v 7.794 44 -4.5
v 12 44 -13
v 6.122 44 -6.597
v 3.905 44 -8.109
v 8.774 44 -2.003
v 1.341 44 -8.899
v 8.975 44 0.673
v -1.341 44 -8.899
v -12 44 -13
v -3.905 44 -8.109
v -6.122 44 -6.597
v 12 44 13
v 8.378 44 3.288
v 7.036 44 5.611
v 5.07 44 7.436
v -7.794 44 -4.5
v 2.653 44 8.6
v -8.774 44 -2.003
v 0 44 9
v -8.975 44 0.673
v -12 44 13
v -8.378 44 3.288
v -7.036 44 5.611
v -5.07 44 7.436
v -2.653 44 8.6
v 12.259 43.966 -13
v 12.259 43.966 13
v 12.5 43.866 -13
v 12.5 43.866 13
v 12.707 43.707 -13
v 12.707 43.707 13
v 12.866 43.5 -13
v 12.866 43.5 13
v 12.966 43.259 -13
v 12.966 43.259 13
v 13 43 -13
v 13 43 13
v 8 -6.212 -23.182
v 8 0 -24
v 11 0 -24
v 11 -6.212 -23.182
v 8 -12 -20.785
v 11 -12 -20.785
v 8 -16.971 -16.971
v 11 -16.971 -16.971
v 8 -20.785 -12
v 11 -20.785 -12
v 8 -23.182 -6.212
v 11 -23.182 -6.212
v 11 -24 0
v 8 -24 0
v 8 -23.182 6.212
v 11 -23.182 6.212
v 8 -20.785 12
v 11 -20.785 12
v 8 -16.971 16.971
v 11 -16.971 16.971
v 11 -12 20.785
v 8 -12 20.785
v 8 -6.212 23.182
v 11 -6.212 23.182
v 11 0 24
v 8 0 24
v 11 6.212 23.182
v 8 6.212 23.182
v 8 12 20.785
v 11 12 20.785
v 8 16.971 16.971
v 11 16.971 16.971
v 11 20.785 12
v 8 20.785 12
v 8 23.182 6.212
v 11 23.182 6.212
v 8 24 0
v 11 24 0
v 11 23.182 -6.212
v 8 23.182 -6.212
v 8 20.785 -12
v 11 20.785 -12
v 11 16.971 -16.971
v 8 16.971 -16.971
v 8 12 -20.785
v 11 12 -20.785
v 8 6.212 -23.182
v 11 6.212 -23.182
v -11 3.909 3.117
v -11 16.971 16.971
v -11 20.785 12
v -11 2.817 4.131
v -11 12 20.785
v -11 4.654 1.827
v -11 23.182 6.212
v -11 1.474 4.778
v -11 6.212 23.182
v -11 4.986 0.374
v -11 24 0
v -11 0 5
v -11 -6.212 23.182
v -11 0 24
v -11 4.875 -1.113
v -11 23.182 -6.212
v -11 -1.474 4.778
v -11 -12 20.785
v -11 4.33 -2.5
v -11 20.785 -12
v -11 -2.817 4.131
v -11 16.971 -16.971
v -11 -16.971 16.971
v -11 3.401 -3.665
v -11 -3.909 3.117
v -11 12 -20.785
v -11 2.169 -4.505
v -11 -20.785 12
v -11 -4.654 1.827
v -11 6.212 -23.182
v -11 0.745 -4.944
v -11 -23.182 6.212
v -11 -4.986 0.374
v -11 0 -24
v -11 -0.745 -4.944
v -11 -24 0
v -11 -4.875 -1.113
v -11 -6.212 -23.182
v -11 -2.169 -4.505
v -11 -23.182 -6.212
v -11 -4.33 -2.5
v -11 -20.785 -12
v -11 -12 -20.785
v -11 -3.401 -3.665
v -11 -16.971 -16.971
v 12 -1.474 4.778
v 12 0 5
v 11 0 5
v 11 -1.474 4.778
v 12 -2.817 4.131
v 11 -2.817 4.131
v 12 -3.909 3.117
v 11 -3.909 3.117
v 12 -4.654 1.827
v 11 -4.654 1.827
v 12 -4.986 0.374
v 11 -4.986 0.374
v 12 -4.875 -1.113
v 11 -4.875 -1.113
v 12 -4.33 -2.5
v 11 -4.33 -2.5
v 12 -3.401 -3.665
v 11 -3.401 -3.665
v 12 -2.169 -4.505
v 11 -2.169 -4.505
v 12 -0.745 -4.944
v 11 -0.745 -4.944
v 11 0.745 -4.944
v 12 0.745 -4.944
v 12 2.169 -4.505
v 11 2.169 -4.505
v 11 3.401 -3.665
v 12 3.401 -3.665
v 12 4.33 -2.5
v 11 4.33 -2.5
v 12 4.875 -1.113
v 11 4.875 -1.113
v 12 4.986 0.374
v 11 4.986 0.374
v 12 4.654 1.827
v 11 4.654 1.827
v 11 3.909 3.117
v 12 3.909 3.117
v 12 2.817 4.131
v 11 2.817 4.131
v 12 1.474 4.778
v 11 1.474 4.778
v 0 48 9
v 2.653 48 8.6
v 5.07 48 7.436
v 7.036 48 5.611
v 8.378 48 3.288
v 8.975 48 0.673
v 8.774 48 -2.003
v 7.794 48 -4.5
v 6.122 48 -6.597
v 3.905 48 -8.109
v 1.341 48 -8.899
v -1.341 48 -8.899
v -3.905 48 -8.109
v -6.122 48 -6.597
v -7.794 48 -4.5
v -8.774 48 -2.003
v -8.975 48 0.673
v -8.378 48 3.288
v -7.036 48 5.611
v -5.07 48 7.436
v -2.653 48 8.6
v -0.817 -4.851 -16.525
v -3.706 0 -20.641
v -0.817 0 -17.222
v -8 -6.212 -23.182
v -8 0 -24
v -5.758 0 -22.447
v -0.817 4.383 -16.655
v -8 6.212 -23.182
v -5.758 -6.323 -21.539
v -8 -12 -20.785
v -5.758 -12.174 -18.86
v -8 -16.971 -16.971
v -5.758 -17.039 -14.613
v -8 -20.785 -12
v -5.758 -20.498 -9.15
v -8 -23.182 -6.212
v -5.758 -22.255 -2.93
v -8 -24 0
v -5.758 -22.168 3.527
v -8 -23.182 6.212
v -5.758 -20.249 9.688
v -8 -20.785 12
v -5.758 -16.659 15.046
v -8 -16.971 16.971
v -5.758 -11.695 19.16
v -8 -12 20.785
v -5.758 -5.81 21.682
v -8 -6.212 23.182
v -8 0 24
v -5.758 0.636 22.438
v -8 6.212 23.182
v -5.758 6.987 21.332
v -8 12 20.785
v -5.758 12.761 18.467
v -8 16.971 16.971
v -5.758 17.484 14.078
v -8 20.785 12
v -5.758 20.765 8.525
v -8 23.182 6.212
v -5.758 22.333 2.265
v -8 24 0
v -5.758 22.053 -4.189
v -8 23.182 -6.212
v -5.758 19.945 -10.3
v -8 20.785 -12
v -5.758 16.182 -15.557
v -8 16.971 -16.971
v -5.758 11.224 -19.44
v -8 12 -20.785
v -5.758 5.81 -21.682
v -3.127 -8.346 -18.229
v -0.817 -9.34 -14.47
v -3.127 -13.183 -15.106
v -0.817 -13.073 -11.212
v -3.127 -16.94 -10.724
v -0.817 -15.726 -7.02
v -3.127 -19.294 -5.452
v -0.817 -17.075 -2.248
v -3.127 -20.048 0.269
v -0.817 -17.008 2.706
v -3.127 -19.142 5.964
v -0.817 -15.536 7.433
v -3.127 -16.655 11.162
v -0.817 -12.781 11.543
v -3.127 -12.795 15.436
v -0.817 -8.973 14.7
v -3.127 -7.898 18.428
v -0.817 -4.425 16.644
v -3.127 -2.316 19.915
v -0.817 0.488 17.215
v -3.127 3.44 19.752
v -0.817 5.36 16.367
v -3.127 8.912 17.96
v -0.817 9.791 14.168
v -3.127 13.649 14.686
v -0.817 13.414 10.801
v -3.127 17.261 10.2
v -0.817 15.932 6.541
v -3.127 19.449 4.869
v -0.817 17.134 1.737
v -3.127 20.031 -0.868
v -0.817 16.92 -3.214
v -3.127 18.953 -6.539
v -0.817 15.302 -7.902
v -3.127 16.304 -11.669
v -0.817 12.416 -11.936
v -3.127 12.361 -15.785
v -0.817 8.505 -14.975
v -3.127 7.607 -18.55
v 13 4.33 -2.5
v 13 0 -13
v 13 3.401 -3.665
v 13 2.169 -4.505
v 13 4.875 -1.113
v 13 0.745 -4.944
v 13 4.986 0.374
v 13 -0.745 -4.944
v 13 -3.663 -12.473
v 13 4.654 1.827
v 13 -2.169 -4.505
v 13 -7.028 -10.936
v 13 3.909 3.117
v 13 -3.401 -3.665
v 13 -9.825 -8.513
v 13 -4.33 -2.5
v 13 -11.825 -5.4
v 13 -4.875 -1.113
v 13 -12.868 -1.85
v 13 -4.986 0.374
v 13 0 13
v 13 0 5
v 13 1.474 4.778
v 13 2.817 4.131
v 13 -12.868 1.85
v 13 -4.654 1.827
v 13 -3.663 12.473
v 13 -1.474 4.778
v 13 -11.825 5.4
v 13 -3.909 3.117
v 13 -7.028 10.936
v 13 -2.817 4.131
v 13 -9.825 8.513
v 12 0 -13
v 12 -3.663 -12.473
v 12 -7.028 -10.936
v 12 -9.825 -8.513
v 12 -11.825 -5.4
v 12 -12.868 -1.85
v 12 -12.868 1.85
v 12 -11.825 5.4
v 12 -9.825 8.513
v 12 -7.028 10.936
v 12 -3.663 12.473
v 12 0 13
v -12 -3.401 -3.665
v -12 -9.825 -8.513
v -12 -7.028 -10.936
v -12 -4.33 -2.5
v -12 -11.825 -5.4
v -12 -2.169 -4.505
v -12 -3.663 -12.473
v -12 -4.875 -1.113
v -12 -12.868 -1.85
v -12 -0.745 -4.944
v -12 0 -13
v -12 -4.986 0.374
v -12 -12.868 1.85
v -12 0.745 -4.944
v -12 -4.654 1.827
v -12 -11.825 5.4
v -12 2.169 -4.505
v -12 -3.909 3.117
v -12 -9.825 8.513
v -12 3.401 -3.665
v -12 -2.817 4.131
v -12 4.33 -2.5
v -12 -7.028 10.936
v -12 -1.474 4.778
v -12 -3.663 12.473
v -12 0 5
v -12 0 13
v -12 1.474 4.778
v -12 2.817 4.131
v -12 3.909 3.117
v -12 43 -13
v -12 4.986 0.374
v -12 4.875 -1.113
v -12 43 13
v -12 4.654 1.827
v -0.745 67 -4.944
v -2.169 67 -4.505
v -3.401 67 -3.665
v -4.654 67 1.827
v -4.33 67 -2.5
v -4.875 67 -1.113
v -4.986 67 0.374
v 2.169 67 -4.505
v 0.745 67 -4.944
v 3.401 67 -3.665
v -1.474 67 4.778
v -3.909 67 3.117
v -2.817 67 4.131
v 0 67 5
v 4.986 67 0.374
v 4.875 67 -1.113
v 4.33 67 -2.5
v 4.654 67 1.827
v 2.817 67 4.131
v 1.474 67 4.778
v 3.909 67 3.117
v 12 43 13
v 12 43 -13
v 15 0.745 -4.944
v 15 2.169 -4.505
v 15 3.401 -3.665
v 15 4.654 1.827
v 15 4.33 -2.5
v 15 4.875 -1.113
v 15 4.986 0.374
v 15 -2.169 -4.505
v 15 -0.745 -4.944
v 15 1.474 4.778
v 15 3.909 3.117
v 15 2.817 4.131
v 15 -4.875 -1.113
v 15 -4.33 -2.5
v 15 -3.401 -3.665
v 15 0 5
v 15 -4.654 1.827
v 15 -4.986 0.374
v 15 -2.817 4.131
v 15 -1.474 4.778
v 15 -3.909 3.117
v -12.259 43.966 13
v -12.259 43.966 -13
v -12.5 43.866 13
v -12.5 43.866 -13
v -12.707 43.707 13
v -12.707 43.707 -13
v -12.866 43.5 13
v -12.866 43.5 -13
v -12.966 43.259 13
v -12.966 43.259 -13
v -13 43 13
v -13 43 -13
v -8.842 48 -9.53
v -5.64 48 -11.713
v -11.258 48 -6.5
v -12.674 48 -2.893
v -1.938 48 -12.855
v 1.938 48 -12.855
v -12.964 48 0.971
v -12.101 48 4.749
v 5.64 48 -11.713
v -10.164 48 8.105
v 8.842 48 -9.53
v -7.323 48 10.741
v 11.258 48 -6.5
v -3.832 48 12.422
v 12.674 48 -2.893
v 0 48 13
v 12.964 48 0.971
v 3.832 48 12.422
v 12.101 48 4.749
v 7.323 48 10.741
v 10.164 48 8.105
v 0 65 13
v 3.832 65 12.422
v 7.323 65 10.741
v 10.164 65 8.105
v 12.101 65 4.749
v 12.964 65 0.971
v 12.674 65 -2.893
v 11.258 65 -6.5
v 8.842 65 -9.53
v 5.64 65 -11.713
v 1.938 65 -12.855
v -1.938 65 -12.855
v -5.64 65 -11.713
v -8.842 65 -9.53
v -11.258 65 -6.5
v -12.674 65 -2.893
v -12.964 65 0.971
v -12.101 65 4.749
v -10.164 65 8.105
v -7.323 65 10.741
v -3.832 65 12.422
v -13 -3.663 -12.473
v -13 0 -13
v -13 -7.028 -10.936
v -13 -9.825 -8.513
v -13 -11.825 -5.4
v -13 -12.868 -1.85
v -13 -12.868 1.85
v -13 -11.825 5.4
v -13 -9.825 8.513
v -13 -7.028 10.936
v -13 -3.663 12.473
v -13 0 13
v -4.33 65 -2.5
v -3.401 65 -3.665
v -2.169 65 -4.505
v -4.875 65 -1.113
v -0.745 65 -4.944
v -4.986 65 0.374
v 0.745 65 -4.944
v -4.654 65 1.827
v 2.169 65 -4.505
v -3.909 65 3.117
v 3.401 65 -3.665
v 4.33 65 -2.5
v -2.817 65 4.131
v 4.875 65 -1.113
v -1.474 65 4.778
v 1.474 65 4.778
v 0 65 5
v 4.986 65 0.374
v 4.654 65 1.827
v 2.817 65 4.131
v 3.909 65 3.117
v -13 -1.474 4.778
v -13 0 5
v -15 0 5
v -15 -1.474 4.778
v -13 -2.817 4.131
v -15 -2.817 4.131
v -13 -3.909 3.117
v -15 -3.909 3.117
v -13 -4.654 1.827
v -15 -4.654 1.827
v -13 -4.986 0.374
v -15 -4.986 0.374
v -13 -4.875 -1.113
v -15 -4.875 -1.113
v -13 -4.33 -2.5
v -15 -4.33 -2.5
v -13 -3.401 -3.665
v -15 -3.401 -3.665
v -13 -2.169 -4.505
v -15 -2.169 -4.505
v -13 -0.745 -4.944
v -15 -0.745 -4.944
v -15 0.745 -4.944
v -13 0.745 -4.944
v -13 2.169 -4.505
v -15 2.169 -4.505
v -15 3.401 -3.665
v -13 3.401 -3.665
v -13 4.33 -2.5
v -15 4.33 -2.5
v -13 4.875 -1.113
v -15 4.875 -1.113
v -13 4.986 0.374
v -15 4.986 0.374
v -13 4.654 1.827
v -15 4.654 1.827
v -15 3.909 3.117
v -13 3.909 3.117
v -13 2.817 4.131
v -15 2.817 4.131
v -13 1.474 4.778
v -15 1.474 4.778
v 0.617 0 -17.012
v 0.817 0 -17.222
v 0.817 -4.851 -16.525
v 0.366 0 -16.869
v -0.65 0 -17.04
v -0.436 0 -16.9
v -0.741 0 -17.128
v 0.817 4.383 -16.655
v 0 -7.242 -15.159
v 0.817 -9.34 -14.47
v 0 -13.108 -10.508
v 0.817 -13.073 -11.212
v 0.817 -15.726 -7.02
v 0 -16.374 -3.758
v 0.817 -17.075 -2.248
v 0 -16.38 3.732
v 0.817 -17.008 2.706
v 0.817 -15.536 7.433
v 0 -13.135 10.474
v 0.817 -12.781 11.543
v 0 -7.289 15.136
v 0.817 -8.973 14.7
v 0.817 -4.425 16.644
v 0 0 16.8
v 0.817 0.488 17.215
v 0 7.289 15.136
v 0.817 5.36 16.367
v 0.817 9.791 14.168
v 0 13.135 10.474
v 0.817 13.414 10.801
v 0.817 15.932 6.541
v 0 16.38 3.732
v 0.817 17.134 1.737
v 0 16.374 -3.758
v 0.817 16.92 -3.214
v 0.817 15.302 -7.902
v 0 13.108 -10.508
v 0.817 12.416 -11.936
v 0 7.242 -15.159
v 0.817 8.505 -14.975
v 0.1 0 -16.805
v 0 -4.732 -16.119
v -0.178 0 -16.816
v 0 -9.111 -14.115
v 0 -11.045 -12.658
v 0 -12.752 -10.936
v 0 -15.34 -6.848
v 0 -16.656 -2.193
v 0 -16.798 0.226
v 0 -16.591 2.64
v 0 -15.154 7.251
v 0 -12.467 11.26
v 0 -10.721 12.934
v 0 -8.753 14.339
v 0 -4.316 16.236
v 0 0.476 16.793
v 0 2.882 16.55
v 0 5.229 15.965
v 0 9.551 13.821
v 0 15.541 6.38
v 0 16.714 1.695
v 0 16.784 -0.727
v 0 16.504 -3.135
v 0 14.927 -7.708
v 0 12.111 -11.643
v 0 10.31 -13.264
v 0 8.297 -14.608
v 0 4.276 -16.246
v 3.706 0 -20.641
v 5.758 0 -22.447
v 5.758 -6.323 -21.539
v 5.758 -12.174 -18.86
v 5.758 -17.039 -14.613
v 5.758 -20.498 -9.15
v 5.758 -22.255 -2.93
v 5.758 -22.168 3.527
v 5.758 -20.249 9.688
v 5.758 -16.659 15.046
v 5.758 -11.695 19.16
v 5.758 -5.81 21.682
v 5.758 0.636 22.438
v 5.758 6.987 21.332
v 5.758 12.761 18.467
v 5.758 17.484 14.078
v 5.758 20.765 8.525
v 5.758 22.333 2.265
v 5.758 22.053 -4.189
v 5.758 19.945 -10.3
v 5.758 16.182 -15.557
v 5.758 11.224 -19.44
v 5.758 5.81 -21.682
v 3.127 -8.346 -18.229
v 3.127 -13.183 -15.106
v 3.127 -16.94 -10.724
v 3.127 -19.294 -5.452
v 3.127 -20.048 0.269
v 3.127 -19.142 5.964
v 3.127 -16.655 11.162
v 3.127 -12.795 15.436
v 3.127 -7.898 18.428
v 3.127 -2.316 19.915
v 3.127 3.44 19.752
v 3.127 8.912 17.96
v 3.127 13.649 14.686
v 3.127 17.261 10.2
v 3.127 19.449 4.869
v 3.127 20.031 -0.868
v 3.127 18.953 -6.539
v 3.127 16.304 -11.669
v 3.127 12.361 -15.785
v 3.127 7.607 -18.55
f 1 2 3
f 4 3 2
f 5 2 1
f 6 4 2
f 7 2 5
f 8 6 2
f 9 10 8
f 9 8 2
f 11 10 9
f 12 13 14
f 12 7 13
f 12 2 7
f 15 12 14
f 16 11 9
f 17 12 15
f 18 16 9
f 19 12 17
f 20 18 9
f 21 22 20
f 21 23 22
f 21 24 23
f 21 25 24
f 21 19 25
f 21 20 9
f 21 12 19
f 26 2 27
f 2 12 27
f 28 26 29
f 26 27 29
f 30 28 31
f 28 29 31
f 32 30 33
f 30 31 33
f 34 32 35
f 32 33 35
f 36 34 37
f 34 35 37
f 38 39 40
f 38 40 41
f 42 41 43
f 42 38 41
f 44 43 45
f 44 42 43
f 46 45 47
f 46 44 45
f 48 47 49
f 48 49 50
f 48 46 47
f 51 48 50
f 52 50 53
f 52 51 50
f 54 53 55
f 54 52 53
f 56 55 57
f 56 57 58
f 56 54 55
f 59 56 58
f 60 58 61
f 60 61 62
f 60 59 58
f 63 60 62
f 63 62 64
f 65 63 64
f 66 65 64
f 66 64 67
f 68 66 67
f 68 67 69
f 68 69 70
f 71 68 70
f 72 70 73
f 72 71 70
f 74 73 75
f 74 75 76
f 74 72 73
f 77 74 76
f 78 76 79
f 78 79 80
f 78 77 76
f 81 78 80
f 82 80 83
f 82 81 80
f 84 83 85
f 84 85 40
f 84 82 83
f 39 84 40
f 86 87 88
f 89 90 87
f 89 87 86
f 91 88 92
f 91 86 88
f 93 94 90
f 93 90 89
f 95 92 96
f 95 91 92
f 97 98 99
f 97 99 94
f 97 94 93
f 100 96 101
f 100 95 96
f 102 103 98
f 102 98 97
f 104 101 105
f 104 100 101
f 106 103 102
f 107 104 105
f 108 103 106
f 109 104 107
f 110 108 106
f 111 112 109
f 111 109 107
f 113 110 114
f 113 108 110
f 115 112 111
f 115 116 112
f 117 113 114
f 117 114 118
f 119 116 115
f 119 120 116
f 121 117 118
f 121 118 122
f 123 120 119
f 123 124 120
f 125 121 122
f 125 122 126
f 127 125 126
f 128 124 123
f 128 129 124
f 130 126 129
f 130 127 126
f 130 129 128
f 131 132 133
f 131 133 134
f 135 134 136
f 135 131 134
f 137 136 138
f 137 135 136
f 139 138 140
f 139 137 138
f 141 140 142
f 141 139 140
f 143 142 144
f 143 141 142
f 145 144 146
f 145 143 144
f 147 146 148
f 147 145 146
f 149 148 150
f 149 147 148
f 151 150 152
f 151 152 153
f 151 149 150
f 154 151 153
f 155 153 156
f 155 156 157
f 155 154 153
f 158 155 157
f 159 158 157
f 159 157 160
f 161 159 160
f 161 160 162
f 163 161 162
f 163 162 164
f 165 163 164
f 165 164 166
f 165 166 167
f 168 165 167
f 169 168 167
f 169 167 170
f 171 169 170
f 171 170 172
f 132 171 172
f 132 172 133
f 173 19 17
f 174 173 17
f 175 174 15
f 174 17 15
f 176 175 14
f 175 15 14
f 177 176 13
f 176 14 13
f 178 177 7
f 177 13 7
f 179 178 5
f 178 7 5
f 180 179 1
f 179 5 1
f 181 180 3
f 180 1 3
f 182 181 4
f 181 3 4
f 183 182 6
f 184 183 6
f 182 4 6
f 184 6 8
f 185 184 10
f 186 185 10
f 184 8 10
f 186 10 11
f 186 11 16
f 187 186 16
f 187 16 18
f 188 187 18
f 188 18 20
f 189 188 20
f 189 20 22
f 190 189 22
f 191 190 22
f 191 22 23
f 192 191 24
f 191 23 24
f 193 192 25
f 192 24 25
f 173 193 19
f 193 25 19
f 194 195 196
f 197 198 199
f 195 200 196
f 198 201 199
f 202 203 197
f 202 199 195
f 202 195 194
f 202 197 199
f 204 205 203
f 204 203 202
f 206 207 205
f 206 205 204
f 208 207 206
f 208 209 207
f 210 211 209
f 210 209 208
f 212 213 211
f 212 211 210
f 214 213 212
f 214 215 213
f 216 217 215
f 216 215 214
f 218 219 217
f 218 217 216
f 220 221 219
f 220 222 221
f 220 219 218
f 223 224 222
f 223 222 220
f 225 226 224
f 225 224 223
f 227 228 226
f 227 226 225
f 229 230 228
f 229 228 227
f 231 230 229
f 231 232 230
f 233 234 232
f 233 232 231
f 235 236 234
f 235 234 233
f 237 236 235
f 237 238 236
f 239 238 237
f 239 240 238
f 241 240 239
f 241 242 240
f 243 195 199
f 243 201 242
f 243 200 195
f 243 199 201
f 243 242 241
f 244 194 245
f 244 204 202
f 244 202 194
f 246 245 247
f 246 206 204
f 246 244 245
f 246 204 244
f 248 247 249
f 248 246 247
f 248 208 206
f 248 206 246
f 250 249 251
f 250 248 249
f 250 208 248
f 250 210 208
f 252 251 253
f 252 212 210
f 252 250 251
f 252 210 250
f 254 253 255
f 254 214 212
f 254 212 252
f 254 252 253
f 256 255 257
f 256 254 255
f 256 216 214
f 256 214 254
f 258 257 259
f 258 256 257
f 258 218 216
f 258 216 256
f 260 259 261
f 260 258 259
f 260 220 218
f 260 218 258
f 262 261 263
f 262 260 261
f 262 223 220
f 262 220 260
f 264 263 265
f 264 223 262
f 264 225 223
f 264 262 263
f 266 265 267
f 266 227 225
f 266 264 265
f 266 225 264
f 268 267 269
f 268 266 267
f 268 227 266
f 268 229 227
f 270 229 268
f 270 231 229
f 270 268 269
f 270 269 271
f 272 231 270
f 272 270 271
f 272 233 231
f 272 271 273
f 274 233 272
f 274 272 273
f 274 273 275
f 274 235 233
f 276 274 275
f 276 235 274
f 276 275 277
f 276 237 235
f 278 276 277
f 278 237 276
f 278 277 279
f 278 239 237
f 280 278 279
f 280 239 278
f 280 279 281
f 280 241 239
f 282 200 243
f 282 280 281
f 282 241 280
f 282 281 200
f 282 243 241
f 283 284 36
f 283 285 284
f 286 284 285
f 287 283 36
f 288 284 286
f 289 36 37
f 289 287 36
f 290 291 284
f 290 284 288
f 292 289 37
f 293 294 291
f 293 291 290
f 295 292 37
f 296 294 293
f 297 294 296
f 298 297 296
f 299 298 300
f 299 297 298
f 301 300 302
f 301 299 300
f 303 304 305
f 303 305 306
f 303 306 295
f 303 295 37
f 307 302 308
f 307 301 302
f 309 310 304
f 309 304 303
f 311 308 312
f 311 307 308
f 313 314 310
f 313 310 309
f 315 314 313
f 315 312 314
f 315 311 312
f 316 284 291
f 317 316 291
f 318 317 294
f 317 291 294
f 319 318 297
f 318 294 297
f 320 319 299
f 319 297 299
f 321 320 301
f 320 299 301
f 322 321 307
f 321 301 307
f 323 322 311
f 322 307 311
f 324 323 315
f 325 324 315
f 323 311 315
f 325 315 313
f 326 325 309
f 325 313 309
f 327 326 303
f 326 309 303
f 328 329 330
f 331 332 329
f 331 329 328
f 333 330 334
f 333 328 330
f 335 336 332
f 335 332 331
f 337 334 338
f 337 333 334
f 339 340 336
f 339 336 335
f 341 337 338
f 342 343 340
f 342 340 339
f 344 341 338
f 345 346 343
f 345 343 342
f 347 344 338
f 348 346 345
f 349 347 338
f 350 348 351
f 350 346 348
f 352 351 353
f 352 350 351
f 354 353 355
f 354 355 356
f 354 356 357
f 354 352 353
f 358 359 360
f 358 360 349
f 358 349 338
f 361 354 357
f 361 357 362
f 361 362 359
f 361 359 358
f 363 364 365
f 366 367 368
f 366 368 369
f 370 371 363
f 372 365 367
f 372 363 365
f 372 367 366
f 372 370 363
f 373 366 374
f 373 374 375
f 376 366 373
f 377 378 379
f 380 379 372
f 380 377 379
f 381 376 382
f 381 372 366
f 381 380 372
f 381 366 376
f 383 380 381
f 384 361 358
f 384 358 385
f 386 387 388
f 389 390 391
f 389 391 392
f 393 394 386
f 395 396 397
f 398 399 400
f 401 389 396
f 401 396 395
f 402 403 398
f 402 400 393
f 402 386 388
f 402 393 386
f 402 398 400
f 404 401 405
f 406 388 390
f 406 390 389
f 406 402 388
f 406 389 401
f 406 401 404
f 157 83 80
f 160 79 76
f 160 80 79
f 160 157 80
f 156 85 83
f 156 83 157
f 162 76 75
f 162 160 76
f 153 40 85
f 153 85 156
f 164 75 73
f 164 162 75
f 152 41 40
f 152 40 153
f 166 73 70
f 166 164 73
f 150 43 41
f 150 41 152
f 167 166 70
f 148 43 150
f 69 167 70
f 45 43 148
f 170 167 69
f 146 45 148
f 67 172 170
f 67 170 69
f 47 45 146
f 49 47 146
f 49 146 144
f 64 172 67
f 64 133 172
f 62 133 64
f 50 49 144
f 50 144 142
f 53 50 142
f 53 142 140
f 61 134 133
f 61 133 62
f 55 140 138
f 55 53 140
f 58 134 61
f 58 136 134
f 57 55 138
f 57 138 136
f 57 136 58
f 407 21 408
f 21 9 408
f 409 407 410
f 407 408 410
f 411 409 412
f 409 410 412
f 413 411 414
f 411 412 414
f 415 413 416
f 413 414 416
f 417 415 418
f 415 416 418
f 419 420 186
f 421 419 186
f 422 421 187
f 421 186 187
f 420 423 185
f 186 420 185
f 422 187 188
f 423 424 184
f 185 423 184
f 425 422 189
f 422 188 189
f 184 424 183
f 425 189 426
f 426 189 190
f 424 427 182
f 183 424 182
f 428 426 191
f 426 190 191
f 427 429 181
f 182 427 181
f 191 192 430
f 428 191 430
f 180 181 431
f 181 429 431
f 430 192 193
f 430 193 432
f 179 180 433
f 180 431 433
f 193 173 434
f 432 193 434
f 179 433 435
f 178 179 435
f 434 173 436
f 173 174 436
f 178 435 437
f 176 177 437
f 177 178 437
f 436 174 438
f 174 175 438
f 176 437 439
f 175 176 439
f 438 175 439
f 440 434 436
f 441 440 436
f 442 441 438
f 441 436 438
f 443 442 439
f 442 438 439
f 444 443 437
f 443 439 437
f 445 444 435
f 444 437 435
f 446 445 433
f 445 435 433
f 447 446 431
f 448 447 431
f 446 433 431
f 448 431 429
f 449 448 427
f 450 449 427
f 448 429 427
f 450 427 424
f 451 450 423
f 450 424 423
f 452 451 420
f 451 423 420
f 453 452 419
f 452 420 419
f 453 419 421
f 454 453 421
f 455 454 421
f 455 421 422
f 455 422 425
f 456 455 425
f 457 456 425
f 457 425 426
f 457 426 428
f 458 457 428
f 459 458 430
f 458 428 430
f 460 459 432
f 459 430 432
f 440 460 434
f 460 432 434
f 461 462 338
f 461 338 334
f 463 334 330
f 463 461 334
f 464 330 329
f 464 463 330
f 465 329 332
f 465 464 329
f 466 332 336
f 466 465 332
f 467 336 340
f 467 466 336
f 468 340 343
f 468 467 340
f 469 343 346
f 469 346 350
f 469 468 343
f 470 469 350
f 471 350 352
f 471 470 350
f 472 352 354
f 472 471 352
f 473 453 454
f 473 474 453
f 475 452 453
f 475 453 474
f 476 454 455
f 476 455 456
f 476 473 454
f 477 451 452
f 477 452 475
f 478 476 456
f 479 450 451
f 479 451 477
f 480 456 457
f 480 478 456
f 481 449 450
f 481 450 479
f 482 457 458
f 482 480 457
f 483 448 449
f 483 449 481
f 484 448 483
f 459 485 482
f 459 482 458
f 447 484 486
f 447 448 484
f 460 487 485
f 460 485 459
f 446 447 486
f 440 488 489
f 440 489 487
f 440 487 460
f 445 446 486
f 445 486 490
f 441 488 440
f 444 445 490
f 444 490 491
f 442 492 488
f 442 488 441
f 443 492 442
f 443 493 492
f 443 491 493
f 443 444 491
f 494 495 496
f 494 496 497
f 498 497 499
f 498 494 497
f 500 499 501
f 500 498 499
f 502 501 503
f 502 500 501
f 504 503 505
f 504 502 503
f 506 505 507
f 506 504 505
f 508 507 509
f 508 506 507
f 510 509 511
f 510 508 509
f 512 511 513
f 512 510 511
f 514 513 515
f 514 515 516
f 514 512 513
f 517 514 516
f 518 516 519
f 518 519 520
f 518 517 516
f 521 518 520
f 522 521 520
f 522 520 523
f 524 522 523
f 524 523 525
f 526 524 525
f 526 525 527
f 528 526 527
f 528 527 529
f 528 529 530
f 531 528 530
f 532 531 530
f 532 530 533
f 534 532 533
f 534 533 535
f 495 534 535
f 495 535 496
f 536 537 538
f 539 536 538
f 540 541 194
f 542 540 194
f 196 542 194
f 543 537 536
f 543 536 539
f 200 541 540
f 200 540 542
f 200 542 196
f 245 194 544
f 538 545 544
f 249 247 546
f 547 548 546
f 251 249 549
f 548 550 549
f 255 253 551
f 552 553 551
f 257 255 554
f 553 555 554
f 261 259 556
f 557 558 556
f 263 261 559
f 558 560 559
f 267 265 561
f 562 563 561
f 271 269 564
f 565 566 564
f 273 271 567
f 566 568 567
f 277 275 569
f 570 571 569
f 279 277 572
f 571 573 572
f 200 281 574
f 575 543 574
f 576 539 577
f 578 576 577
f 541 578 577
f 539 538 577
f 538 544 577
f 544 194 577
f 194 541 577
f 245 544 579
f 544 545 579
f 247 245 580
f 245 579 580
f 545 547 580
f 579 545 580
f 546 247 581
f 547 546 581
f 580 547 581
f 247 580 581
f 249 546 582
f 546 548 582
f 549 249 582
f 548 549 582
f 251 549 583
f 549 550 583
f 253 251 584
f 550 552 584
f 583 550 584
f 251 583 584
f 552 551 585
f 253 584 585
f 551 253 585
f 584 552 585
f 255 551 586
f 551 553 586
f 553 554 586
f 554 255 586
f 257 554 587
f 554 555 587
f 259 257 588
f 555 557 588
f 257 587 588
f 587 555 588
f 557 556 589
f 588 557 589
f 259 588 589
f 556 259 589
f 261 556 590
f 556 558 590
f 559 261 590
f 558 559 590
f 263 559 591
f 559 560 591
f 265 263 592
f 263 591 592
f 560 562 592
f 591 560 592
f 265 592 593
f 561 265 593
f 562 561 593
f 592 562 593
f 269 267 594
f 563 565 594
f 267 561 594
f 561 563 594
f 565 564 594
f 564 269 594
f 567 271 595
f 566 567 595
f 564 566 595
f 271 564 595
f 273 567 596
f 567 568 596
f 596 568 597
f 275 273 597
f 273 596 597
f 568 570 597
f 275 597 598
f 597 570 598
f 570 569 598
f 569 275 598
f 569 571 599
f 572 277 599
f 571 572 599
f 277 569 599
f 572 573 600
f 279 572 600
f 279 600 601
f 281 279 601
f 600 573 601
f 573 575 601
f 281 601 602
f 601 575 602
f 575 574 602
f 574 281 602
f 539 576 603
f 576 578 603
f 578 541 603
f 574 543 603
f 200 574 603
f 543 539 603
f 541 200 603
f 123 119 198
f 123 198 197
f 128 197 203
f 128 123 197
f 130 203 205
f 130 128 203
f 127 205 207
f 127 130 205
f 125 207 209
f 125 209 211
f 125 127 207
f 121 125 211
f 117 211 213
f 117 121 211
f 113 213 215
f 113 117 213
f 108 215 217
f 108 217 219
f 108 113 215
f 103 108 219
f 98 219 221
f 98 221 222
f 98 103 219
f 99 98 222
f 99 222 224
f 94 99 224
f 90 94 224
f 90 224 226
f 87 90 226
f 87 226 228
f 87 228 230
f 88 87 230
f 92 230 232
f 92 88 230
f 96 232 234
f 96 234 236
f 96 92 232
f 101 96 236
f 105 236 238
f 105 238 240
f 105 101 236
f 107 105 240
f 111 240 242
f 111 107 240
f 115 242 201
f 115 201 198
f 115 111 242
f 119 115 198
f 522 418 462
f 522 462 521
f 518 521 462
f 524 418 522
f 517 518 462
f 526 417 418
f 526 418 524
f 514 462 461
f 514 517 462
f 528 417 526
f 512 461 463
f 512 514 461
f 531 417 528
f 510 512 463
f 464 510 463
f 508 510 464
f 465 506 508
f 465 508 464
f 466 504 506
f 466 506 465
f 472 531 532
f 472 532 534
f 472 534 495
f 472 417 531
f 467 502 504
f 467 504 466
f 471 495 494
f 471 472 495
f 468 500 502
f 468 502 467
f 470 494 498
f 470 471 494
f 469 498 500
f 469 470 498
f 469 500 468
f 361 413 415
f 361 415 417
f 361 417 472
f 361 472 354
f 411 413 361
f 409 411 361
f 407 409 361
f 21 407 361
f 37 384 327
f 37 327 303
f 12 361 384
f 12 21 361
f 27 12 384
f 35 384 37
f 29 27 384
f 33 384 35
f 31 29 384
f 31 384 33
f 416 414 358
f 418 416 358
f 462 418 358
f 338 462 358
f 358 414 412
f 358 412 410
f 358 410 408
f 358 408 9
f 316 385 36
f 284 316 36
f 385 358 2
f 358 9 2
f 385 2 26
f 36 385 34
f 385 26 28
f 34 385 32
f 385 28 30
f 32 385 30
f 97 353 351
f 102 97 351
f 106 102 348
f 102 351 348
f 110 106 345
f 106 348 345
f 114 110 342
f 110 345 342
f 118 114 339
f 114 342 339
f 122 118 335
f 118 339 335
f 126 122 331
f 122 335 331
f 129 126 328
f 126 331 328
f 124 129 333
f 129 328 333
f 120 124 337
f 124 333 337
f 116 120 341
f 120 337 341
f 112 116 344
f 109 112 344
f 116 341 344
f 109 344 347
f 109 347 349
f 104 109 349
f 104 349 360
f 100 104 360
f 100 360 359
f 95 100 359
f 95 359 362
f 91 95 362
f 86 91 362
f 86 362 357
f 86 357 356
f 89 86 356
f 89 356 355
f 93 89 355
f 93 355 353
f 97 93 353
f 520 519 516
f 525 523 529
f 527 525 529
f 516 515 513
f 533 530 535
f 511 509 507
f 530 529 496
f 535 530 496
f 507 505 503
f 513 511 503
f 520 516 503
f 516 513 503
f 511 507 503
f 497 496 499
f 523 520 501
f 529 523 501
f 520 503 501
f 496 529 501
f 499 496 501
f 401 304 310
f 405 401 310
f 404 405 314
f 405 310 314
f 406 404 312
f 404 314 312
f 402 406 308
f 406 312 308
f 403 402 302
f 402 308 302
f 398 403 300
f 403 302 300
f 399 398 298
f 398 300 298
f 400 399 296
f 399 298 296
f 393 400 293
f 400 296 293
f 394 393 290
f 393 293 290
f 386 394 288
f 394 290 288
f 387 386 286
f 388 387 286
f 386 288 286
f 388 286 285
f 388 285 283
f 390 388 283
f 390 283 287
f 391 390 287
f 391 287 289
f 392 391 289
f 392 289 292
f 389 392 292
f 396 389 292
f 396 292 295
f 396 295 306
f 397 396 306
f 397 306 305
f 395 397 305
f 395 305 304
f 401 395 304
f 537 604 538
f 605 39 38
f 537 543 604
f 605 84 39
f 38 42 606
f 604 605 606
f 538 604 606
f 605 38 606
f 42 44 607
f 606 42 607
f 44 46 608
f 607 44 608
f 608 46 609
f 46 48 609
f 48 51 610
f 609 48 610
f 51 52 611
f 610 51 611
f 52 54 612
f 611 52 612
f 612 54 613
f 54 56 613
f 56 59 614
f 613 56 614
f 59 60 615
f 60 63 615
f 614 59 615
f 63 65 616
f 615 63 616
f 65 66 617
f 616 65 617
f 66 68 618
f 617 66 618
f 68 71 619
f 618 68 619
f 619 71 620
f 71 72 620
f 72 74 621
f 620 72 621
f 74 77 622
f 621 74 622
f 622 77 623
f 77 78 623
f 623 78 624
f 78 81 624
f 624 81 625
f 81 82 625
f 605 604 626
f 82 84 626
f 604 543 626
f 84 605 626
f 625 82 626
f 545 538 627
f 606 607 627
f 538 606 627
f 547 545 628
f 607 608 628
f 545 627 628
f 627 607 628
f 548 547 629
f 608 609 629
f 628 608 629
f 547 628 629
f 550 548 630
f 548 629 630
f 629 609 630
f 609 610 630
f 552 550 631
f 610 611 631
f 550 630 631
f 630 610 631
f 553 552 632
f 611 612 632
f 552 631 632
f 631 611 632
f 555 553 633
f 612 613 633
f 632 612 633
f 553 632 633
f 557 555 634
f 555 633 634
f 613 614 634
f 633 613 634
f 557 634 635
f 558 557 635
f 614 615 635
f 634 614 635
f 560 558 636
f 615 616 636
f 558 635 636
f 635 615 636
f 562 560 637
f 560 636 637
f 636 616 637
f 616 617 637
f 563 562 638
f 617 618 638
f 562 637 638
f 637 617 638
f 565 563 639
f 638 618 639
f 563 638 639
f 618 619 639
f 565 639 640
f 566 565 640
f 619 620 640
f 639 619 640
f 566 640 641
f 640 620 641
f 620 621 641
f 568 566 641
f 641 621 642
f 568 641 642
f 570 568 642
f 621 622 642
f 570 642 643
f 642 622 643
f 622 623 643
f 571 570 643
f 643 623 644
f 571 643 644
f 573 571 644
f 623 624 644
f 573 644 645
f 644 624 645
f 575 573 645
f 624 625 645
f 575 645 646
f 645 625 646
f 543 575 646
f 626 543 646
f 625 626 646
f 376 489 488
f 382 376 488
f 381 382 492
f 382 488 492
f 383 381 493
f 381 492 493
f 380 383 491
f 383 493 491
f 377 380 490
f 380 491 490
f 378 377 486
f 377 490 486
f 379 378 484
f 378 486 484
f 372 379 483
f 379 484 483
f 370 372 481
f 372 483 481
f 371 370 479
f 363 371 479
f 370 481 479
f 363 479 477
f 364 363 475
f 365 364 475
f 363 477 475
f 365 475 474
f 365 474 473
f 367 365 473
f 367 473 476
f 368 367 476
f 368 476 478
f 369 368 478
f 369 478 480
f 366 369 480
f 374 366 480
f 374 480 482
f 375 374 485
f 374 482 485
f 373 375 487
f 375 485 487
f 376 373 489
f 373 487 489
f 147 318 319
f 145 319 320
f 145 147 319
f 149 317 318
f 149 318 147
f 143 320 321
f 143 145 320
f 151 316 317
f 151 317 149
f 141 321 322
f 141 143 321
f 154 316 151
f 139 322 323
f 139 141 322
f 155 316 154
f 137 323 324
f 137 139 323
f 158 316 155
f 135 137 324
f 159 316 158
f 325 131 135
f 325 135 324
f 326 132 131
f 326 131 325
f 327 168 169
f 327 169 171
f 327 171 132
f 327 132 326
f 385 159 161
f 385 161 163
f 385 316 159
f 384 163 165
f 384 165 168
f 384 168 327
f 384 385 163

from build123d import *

# Parameters (mm, degrees)
FILLET_1_R                  = 1
EXTRUDE_1_DEPTH             = 13
EXTRUDE_3_DEPTH             = 1
EXTRUDE_4_REACH             = 58.462
SKETCH_5_R                  = 5
EXTRUDE_4_DIRECTION_2_DEPTH = 2
SKETCH_8_R                  = 9
EXTRUDE_5_DEPTH             = 4
SKETCH_9_R                  = 13
EXTRUDE_6_DEPTH             = 17
SKETCH_10_R                 = 5
EXTRUDE_7_DEPTH             = 2
FILLET_3_R                  = 1


with BuildPart() as part:
    # 草图1 → 旋转1 (revolve)
    with BuildSketch(Plane.XY, mode=Mode.PRIVATE) as revolve_1_sk:
        with BuildLine():
            Line((-11, 0), (0, 0))
            Line((0, 0), (0, 16))
            add(Edge.make_bspline(
                [(0, 16), (-3.200328023, 21.071332496), (-8, 24)],
                knots=[0, 0, 0, 0.822363045, 0.822363045, 0.822363045], degree=2))
            Line((-8, 24), (-11, 24))
            Line((-11, 24), (-11, 0))
        make_face()
        with BuildLine():
            Line((0, 16), (0, 0))
            Line((0, 0), (11, 0))
            Line((11, 0), (11, 24))
            Line((11, 24), (8, 24))
            add(Edge.make_bspline(
                [(0, 16), (3.200328023, 21.071332496), (8, 24)],
                knots=[0, 0, 0, 0.822363045, 0.822363045, 0.822363045], degree=2))
        make_face()
    revolve(revolve_1_sk.sketch.rotate(Axis((11, 0, 0), (-1, 0, 0)), 90), axis=Axis((11, 0, 0), (-1, 0, 0)))

    # 圆角1
    fillet_1_edges = [part.edges().sort_by_distance(p)[0] for p in [
        (0, 0, 16),
    ]]
    fillet(fillet_1_edges, radius=FILLET_1_R)

    # 凸台-拉伸4: up to this face of the body (flat: up to its plane)
    extrude_4_end = Plane(part.part.faces().sort_by_distance((11, 0, 0))[0])
    # 草图5 → 凸台-拉伸4 (add, up to the picked face)
    with BuildSketch(Plane(origin=(13, 0, 0), x_dir=(0, 0, -1), z_dir=(1, 0, 0)), mode=Mode.PRIVATE) as extrude_4_sk1:
        with Locations(Location((0, 0, 0), (0, 0, 180))):
            Circle(SKETCH_5_R)
    extrude_4_tool1 = split(extrude(extrude_4_sk1.sketch, amount=-EXTRUDE_4_REACH, mode=Mode.PRIVATE), bisect_by=extrude_4_end, keep=Keep.BOTH, mode=Mode.PRIVATE)


with BuildPart() as body_2:
    # 草图2 → 凸台-拉伸1 (new, symmetric)
    with BuildSketch(Plane.XY):
        Polygon((-12, 0), (-12, 43), (12, 43), (12, 0), (13, 0), (13, 44), (-13, 44), (-13, 0), align=None)
    extrude(amount=EXTRUDE_1_DEPTH, both=True)


with BuildPart() as body_3:
    # 草图4 → 凸台-拉伸3 (new body)
    with BuildSketch(Plane(origin=(13, 0, 0), x_dir=(0, 0, -1), z_dir=(1, 0, 0))):
        with BuildLine():
            ThreePointArc((13, 0), (0, -13), (-13, 0))
            Line((-13, 0), (13, 0))
        make_face()
    extrude(amount=-EXTRUDE_3_DEPTH)


with BuildPart() as part_1:
    add(part.part)

    add(body_2.part)  # 凸台-拉伸4 merges body 2

    add(body_3.part)  # 凸台-拉伸4 merges body 3
    add(extrude_4_tool1.solids().sort_by(Axis((13, 0, 0), (-1, 0, 0)))[0])

    # 草图5 → 凸台-拉伸4 direction 2 (add)
    with BuildSketch(Plane(origin=(13, 0, 0), x_dir=(0, 0, -1), z_dir=(1, 0, 0))):
        with Locations(Location((0, 0, 0), (0, 0, 180))):
            Circle(SKETCH_5_R)
    extrude(amount=EXTRUDE_4_DIRECTION_2_DEPTH)


with BuildPart() as body_2_2:
    # 镜向9: mirrored copy
    add(part_1.part.mirror(Plane(origin=(0, 0, 0), x_dir=(0, 0, 1), z_dir=(1, 0, 0))))


with BuildPart() as part_2:
    add(part_1.part)

    add(body_2_2.part)  # 凸台-拉伸5 merges body 2 2
    # 草图8 → 凸台-拉伸5 (add)
    with BuildSketch(Plane(origin=(0, 44, 0), x_dir=(1, 0, 0), z_dir=(0, 1, 0))):
        with Locations(Location((0, 0, 0), (0, 0, 270))):
            Circle(SKETCH_8_R)
    extrude(amount=EXTRUDE_5_DEPTH)

    # 草图9 → 凸台-拉伸6 (add)
    with BuildSketch(Plane(origin=(0, 48, 0), x_dir=(1, 0, 0), z_dir=(0, 1, 0))):
        with Locations(Location((0, 0, 0), (0, 0, 270))):
            Circle(SKETCH_9_R)
    extrude(amount=EXTRUDE_6_DEPTH)

    # 草图10 → 凸台-拉伸7 (add)
    with BuildSketch(Plane(origin=(0, 65, 0), x_dir=(1, 0, 0), z_dir=(0, 1, 0))):
        with Locations(Location((0, 0, 0), (0, 0, 270))):
            Circle(SKETCH_10_R)
    extrude(amount=EXTRUDE_7_DEPTH)

    # 圆角3
    fillet_3_edges = [part_2.edges().sort_by_distance(p)[0] for p in [
        (-13, 44, 0),
        (13, 44, 0),
    ]]
    fillet(fillet_3_edges, radius=FILLET_3_R)


solid = part_2.part
